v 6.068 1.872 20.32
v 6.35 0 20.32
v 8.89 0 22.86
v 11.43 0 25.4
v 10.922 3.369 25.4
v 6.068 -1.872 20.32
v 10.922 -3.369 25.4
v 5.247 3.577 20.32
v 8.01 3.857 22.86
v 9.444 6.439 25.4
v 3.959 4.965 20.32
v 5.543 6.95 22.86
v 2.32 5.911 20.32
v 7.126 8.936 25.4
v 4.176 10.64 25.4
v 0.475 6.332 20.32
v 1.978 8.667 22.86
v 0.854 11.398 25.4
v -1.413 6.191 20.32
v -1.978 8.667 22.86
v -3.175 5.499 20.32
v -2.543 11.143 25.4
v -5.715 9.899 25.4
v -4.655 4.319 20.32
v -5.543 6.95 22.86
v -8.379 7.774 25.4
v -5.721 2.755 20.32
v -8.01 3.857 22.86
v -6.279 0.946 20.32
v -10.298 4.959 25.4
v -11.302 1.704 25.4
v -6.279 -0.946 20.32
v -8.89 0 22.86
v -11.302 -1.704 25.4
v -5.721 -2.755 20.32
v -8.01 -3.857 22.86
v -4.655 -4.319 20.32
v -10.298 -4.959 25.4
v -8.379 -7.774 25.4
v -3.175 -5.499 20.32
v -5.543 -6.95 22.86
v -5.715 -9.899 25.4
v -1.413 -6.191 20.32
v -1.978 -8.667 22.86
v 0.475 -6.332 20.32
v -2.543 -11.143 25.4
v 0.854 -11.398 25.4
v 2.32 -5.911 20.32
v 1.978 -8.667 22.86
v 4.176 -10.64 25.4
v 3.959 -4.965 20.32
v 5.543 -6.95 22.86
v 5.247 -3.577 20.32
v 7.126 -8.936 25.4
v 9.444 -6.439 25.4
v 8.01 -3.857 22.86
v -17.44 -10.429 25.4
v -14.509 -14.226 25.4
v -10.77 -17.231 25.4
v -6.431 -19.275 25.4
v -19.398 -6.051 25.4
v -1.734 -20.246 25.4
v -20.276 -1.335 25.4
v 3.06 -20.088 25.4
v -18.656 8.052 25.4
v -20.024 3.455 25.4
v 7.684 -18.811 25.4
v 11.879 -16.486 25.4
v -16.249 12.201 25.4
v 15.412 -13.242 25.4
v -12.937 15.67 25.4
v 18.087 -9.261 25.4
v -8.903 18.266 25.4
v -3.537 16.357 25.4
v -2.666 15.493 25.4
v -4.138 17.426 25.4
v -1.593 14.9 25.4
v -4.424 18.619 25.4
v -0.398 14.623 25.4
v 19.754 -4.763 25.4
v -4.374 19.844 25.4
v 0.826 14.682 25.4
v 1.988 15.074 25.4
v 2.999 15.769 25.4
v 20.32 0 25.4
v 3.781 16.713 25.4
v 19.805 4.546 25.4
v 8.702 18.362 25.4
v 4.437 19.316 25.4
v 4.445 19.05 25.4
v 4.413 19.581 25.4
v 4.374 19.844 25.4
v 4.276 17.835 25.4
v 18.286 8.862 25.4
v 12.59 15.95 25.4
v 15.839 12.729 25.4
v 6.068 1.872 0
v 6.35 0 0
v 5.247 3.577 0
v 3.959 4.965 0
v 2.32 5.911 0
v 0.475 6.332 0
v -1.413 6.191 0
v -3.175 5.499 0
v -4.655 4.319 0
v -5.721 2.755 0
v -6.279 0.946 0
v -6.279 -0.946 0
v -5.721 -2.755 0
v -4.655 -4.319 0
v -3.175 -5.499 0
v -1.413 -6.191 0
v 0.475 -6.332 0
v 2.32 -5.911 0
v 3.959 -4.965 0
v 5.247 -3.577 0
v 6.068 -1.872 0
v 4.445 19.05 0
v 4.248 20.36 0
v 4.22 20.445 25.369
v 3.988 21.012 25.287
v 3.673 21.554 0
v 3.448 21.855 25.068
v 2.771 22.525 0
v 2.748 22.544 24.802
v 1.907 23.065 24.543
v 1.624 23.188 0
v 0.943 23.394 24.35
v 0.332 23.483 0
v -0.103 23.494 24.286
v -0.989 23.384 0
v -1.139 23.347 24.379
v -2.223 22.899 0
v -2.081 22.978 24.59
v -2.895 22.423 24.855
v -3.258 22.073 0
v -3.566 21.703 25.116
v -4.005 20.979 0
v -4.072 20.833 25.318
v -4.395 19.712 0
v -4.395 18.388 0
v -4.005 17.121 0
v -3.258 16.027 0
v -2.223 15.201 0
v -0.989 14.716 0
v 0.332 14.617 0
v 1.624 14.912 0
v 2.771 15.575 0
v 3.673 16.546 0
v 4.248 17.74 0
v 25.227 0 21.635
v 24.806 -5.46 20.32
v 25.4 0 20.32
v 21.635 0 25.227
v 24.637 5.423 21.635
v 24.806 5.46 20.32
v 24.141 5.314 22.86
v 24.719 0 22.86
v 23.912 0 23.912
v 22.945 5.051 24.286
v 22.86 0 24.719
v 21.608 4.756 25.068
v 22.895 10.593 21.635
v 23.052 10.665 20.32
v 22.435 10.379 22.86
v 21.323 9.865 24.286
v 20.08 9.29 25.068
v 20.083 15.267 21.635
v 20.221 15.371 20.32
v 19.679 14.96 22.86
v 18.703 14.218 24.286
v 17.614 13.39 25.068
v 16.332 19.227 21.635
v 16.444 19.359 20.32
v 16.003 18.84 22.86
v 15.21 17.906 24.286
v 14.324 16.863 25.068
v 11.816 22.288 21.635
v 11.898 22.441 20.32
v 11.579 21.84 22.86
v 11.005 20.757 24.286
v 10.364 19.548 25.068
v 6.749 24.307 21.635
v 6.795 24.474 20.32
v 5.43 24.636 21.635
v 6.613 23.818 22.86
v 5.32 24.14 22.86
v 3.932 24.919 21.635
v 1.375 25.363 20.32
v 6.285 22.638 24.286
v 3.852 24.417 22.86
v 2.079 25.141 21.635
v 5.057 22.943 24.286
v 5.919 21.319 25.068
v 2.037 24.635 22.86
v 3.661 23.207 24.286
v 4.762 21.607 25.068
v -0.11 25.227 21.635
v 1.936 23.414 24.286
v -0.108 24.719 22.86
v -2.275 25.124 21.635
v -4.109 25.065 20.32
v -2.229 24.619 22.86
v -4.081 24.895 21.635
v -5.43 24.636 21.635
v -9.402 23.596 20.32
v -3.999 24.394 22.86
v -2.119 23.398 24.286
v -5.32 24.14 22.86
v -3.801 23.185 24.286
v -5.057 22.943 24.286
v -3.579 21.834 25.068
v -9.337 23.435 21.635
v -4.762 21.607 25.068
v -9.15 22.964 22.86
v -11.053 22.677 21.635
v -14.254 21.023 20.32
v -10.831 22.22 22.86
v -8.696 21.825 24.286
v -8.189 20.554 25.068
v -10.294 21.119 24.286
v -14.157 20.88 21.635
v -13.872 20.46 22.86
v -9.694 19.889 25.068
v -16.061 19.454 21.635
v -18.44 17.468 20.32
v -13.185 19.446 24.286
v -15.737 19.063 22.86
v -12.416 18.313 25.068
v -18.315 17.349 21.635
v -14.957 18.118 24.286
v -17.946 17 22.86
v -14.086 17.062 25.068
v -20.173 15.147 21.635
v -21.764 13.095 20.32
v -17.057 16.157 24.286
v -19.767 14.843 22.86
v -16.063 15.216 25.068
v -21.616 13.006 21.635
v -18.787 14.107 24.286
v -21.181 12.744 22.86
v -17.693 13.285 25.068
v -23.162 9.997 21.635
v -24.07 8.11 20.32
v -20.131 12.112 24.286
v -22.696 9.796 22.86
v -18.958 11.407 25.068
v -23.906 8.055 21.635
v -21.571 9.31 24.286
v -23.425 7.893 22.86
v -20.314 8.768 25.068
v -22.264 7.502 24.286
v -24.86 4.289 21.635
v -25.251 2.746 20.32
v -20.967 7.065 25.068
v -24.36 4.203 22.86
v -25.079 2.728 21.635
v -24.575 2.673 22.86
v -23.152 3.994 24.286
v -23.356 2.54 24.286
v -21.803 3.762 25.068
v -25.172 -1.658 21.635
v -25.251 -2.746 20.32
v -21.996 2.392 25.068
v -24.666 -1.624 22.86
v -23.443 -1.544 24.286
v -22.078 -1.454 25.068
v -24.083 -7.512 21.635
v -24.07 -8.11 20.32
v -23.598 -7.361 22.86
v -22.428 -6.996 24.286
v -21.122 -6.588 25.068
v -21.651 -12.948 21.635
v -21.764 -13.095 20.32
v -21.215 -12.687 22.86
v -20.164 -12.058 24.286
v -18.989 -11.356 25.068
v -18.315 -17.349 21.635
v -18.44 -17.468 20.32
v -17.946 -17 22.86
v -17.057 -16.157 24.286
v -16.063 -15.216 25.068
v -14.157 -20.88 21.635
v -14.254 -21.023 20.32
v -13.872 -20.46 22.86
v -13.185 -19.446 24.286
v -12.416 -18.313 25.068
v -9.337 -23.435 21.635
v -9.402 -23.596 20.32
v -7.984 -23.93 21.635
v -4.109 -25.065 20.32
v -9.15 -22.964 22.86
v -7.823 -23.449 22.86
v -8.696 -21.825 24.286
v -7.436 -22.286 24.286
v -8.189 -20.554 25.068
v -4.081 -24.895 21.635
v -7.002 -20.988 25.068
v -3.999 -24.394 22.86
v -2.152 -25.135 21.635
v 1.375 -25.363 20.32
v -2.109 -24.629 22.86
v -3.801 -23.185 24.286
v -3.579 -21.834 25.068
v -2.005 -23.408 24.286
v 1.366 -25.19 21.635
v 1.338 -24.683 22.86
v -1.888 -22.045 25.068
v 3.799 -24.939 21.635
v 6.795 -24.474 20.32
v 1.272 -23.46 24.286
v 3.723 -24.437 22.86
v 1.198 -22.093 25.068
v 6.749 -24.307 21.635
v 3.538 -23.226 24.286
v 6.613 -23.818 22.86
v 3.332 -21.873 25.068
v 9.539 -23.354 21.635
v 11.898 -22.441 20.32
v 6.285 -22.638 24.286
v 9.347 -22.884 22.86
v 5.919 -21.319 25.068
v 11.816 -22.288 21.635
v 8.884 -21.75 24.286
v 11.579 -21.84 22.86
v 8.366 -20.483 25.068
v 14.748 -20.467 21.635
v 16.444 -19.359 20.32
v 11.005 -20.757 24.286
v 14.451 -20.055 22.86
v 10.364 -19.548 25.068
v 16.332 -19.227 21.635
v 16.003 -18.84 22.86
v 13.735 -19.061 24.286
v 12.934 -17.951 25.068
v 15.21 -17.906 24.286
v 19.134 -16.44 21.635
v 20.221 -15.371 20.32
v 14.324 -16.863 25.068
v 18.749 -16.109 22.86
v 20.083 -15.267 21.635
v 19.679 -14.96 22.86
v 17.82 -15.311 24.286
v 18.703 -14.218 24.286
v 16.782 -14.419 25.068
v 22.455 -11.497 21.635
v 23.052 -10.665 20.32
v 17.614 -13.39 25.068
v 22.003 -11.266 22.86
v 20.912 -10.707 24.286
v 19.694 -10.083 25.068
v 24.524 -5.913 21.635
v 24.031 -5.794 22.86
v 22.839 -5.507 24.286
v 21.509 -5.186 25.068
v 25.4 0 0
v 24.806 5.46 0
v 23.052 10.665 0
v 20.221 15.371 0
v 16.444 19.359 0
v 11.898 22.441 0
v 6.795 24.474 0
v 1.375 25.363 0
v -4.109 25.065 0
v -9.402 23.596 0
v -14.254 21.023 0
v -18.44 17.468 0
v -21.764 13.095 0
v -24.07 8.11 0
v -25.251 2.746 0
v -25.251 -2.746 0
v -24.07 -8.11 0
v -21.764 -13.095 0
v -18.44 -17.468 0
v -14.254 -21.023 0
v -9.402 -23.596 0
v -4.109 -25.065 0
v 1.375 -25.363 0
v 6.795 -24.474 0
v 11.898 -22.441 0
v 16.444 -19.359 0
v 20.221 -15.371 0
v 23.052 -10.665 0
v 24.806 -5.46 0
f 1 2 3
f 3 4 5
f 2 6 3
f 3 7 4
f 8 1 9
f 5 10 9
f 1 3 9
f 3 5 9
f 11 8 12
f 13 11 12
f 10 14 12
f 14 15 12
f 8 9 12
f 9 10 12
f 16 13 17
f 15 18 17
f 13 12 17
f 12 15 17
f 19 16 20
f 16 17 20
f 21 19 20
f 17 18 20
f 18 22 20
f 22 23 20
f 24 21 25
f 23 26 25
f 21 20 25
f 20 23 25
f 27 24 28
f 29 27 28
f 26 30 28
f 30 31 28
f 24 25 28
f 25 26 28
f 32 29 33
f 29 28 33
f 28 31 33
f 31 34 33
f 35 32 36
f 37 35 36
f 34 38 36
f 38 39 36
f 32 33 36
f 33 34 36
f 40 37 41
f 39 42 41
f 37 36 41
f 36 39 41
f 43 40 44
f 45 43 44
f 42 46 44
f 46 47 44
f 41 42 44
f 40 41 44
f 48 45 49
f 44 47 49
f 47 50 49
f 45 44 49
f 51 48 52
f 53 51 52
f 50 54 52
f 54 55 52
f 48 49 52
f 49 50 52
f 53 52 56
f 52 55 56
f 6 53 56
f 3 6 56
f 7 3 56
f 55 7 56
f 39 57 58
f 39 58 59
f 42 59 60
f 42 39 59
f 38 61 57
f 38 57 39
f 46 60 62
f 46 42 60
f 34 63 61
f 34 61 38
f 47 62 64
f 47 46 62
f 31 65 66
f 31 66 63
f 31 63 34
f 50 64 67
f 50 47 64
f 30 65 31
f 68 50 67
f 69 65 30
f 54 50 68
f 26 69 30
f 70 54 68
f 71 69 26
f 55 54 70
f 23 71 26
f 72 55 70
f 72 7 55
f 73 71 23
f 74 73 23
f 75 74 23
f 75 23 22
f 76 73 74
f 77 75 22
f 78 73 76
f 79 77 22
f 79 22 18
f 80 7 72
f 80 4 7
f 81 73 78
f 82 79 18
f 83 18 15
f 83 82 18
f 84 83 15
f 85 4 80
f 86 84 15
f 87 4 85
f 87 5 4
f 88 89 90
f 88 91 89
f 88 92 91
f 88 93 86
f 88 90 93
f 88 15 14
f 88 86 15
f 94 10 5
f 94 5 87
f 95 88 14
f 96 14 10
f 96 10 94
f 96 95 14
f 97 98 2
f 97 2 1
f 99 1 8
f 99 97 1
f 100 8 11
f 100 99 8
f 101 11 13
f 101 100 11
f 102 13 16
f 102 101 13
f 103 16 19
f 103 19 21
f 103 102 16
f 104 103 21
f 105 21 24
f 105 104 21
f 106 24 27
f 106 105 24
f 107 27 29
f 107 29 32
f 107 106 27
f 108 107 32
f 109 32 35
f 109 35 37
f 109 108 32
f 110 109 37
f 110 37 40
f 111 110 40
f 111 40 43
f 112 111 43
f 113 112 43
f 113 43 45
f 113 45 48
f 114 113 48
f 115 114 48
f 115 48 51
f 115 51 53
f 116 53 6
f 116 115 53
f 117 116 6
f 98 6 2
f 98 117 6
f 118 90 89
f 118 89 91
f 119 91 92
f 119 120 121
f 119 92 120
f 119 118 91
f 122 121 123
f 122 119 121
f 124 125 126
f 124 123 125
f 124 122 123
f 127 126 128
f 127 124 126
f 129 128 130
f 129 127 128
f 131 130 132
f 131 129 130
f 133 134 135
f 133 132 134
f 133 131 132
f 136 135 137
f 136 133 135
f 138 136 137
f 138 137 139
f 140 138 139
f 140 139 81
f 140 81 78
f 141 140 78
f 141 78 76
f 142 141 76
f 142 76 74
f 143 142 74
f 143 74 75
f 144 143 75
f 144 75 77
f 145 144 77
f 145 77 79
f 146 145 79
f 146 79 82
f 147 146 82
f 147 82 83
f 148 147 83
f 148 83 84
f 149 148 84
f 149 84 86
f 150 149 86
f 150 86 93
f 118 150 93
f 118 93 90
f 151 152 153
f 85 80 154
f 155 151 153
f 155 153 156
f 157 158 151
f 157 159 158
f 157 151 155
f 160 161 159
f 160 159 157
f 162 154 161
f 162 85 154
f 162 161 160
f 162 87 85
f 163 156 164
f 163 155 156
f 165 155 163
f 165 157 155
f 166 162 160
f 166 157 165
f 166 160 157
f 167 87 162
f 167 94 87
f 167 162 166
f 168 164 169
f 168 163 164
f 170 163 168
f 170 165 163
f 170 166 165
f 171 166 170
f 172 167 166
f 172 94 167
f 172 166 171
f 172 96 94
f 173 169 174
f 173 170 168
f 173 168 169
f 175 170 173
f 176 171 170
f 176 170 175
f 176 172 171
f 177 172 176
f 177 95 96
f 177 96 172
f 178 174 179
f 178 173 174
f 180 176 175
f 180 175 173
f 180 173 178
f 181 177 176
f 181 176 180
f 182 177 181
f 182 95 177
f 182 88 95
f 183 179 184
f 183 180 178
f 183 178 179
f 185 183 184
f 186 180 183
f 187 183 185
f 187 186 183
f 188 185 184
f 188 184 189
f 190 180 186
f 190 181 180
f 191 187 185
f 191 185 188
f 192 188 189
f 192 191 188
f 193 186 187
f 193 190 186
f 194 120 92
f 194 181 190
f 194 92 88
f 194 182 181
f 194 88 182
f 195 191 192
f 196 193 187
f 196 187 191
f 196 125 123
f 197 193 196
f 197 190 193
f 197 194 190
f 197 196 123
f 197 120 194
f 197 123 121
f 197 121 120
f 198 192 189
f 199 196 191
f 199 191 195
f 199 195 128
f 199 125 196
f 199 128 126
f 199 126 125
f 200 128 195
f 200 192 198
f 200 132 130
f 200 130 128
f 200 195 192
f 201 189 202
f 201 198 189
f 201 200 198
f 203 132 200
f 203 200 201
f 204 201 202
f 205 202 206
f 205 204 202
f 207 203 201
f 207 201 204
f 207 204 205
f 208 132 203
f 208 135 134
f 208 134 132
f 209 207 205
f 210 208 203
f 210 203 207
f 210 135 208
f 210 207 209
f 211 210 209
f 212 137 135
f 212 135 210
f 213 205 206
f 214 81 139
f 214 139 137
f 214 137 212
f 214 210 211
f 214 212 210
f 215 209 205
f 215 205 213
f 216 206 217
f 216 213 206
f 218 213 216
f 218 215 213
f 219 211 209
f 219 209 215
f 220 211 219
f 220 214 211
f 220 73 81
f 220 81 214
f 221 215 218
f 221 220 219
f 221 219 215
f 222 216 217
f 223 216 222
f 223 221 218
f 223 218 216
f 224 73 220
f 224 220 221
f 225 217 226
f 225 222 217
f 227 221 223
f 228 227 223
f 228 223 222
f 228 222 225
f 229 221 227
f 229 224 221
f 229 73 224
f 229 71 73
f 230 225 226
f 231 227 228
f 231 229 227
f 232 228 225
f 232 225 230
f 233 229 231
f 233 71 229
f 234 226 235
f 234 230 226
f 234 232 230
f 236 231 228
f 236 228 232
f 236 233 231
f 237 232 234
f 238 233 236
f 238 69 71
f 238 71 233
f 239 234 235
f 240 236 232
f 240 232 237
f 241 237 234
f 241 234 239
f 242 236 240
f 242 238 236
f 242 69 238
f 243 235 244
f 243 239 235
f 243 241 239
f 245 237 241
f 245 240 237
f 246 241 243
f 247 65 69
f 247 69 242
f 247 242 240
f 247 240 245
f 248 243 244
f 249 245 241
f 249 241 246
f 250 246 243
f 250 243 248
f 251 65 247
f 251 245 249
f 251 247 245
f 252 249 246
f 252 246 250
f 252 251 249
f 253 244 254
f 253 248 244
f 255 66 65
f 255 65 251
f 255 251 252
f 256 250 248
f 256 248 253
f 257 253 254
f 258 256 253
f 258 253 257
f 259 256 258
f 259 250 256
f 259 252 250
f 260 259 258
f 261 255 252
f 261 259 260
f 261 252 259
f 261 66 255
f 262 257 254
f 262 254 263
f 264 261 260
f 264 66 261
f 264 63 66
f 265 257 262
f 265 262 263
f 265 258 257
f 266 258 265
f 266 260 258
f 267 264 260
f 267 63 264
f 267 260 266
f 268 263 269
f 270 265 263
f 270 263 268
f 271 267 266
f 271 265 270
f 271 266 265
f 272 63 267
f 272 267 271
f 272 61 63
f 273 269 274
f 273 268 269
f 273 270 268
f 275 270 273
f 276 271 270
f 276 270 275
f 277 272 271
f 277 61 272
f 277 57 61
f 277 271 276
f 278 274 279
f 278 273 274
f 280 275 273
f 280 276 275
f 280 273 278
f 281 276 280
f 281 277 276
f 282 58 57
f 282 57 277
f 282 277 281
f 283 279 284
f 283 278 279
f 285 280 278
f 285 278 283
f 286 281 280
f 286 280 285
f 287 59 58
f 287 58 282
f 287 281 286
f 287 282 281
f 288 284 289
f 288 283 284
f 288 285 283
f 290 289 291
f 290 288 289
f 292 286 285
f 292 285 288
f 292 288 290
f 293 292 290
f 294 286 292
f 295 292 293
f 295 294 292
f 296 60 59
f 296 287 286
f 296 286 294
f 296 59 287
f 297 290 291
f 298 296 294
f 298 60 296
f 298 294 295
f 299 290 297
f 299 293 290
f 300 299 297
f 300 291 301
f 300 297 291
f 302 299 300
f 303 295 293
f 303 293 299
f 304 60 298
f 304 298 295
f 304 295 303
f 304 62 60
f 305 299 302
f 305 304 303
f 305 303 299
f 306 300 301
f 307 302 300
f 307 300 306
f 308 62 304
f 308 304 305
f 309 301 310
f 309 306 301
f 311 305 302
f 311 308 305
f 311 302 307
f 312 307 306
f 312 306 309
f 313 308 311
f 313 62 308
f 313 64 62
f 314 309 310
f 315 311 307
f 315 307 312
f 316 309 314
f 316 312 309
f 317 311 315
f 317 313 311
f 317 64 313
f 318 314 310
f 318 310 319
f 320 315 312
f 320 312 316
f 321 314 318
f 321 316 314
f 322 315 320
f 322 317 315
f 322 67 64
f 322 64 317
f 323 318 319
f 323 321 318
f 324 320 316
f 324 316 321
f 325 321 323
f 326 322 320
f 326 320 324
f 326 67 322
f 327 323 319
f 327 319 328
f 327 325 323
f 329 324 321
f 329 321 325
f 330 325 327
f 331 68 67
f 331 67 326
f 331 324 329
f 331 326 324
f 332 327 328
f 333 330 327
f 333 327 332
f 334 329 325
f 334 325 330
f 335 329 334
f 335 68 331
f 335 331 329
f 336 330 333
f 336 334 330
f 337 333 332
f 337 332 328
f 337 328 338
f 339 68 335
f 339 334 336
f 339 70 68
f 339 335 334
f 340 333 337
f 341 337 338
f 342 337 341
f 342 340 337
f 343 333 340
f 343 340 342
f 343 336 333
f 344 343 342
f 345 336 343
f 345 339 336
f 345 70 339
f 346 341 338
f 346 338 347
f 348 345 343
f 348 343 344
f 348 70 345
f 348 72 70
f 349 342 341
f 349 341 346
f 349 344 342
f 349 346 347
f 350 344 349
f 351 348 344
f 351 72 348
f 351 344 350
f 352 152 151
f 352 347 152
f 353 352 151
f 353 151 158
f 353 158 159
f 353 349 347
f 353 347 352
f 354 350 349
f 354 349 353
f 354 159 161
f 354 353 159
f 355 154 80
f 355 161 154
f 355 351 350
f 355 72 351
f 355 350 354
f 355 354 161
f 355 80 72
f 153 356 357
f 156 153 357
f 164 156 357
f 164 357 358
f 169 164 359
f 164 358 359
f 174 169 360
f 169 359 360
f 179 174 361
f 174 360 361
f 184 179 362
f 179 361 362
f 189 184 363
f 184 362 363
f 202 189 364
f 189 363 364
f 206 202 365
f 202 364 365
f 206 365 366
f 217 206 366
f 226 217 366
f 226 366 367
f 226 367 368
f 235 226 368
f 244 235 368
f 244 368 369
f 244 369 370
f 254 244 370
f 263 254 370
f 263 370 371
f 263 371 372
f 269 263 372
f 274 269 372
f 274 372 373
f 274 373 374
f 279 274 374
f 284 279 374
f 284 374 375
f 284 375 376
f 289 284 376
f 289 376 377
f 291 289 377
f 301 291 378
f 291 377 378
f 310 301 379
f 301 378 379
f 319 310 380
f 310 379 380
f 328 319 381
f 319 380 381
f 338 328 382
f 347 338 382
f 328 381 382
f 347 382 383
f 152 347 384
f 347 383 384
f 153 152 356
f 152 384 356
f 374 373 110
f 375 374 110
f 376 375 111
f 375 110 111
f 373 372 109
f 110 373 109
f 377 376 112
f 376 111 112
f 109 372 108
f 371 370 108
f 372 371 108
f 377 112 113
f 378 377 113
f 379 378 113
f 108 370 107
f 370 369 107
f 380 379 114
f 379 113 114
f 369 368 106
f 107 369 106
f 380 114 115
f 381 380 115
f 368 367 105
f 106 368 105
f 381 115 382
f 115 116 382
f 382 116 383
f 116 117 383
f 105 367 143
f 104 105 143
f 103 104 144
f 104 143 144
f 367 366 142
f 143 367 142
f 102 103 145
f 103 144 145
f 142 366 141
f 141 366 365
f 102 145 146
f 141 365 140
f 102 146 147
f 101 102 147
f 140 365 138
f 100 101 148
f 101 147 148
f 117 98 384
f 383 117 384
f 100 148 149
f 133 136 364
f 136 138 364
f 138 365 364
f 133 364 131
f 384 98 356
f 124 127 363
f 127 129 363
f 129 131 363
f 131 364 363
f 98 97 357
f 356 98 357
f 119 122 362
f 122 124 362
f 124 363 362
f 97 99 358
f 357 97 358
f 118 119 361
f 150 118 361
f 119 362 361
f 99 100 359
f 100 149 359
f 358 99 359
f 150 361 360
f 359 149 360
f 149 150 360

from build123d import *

# Parameters (mm, degrees)
F0_R     = 25.4
F0_R_2   = 6.35
F0_R_3   = 4.445
F1_DEPTH = 25.4
F3_SIZE  = 5.08


# Not quite as in the source:
# - a fillet or chamfer that OpenCascade refuses, or shapes differently, is made with other operations: its cross-section is extruded or revolved along the edge and cut away or added


with BuildPart() as f1:
    # F0 (on Top) → F1 (new body)
    with BuildSketch(Plane.XY):
        Circle(F0_R)
        Circle(F0_R_2, mode=Mode.SUBTRACT)
        with Locations((0, 19.05)):
            Circle(F0_R_3, mode=Mode.SUBTRACT)
    extrude(amount=F1_DEPTH)

    # F2: fillet of radius 5.08 on 1 edges, made by hand

    # F2_s1 → F2_t2 (revolve, cut)
    with BuildSketch(Plane.XZ):
        with BuildLine():
            ThreePointArc((25.4, 20.32), (23.9121024484, 23.9121024484), (20.32, 25.4))
            Line((20.32, 25.4), (25.4, 25.4))
            Line((25.4, 25.4), (25.4, 20.32))
        make_face()
    revolve(axis=Axis((0, 0, 25.4), (0, 0, 1)), mode=Mode.SUBTRACT)

    # F3
    f3_edges = [f1.edges().sort_by_distance(p)[0] for p in [
        (-6.35, 0, 25.4),
    ]]
    chamfer(f3_edges, length=F3_SIZE)


solid = f1.part
